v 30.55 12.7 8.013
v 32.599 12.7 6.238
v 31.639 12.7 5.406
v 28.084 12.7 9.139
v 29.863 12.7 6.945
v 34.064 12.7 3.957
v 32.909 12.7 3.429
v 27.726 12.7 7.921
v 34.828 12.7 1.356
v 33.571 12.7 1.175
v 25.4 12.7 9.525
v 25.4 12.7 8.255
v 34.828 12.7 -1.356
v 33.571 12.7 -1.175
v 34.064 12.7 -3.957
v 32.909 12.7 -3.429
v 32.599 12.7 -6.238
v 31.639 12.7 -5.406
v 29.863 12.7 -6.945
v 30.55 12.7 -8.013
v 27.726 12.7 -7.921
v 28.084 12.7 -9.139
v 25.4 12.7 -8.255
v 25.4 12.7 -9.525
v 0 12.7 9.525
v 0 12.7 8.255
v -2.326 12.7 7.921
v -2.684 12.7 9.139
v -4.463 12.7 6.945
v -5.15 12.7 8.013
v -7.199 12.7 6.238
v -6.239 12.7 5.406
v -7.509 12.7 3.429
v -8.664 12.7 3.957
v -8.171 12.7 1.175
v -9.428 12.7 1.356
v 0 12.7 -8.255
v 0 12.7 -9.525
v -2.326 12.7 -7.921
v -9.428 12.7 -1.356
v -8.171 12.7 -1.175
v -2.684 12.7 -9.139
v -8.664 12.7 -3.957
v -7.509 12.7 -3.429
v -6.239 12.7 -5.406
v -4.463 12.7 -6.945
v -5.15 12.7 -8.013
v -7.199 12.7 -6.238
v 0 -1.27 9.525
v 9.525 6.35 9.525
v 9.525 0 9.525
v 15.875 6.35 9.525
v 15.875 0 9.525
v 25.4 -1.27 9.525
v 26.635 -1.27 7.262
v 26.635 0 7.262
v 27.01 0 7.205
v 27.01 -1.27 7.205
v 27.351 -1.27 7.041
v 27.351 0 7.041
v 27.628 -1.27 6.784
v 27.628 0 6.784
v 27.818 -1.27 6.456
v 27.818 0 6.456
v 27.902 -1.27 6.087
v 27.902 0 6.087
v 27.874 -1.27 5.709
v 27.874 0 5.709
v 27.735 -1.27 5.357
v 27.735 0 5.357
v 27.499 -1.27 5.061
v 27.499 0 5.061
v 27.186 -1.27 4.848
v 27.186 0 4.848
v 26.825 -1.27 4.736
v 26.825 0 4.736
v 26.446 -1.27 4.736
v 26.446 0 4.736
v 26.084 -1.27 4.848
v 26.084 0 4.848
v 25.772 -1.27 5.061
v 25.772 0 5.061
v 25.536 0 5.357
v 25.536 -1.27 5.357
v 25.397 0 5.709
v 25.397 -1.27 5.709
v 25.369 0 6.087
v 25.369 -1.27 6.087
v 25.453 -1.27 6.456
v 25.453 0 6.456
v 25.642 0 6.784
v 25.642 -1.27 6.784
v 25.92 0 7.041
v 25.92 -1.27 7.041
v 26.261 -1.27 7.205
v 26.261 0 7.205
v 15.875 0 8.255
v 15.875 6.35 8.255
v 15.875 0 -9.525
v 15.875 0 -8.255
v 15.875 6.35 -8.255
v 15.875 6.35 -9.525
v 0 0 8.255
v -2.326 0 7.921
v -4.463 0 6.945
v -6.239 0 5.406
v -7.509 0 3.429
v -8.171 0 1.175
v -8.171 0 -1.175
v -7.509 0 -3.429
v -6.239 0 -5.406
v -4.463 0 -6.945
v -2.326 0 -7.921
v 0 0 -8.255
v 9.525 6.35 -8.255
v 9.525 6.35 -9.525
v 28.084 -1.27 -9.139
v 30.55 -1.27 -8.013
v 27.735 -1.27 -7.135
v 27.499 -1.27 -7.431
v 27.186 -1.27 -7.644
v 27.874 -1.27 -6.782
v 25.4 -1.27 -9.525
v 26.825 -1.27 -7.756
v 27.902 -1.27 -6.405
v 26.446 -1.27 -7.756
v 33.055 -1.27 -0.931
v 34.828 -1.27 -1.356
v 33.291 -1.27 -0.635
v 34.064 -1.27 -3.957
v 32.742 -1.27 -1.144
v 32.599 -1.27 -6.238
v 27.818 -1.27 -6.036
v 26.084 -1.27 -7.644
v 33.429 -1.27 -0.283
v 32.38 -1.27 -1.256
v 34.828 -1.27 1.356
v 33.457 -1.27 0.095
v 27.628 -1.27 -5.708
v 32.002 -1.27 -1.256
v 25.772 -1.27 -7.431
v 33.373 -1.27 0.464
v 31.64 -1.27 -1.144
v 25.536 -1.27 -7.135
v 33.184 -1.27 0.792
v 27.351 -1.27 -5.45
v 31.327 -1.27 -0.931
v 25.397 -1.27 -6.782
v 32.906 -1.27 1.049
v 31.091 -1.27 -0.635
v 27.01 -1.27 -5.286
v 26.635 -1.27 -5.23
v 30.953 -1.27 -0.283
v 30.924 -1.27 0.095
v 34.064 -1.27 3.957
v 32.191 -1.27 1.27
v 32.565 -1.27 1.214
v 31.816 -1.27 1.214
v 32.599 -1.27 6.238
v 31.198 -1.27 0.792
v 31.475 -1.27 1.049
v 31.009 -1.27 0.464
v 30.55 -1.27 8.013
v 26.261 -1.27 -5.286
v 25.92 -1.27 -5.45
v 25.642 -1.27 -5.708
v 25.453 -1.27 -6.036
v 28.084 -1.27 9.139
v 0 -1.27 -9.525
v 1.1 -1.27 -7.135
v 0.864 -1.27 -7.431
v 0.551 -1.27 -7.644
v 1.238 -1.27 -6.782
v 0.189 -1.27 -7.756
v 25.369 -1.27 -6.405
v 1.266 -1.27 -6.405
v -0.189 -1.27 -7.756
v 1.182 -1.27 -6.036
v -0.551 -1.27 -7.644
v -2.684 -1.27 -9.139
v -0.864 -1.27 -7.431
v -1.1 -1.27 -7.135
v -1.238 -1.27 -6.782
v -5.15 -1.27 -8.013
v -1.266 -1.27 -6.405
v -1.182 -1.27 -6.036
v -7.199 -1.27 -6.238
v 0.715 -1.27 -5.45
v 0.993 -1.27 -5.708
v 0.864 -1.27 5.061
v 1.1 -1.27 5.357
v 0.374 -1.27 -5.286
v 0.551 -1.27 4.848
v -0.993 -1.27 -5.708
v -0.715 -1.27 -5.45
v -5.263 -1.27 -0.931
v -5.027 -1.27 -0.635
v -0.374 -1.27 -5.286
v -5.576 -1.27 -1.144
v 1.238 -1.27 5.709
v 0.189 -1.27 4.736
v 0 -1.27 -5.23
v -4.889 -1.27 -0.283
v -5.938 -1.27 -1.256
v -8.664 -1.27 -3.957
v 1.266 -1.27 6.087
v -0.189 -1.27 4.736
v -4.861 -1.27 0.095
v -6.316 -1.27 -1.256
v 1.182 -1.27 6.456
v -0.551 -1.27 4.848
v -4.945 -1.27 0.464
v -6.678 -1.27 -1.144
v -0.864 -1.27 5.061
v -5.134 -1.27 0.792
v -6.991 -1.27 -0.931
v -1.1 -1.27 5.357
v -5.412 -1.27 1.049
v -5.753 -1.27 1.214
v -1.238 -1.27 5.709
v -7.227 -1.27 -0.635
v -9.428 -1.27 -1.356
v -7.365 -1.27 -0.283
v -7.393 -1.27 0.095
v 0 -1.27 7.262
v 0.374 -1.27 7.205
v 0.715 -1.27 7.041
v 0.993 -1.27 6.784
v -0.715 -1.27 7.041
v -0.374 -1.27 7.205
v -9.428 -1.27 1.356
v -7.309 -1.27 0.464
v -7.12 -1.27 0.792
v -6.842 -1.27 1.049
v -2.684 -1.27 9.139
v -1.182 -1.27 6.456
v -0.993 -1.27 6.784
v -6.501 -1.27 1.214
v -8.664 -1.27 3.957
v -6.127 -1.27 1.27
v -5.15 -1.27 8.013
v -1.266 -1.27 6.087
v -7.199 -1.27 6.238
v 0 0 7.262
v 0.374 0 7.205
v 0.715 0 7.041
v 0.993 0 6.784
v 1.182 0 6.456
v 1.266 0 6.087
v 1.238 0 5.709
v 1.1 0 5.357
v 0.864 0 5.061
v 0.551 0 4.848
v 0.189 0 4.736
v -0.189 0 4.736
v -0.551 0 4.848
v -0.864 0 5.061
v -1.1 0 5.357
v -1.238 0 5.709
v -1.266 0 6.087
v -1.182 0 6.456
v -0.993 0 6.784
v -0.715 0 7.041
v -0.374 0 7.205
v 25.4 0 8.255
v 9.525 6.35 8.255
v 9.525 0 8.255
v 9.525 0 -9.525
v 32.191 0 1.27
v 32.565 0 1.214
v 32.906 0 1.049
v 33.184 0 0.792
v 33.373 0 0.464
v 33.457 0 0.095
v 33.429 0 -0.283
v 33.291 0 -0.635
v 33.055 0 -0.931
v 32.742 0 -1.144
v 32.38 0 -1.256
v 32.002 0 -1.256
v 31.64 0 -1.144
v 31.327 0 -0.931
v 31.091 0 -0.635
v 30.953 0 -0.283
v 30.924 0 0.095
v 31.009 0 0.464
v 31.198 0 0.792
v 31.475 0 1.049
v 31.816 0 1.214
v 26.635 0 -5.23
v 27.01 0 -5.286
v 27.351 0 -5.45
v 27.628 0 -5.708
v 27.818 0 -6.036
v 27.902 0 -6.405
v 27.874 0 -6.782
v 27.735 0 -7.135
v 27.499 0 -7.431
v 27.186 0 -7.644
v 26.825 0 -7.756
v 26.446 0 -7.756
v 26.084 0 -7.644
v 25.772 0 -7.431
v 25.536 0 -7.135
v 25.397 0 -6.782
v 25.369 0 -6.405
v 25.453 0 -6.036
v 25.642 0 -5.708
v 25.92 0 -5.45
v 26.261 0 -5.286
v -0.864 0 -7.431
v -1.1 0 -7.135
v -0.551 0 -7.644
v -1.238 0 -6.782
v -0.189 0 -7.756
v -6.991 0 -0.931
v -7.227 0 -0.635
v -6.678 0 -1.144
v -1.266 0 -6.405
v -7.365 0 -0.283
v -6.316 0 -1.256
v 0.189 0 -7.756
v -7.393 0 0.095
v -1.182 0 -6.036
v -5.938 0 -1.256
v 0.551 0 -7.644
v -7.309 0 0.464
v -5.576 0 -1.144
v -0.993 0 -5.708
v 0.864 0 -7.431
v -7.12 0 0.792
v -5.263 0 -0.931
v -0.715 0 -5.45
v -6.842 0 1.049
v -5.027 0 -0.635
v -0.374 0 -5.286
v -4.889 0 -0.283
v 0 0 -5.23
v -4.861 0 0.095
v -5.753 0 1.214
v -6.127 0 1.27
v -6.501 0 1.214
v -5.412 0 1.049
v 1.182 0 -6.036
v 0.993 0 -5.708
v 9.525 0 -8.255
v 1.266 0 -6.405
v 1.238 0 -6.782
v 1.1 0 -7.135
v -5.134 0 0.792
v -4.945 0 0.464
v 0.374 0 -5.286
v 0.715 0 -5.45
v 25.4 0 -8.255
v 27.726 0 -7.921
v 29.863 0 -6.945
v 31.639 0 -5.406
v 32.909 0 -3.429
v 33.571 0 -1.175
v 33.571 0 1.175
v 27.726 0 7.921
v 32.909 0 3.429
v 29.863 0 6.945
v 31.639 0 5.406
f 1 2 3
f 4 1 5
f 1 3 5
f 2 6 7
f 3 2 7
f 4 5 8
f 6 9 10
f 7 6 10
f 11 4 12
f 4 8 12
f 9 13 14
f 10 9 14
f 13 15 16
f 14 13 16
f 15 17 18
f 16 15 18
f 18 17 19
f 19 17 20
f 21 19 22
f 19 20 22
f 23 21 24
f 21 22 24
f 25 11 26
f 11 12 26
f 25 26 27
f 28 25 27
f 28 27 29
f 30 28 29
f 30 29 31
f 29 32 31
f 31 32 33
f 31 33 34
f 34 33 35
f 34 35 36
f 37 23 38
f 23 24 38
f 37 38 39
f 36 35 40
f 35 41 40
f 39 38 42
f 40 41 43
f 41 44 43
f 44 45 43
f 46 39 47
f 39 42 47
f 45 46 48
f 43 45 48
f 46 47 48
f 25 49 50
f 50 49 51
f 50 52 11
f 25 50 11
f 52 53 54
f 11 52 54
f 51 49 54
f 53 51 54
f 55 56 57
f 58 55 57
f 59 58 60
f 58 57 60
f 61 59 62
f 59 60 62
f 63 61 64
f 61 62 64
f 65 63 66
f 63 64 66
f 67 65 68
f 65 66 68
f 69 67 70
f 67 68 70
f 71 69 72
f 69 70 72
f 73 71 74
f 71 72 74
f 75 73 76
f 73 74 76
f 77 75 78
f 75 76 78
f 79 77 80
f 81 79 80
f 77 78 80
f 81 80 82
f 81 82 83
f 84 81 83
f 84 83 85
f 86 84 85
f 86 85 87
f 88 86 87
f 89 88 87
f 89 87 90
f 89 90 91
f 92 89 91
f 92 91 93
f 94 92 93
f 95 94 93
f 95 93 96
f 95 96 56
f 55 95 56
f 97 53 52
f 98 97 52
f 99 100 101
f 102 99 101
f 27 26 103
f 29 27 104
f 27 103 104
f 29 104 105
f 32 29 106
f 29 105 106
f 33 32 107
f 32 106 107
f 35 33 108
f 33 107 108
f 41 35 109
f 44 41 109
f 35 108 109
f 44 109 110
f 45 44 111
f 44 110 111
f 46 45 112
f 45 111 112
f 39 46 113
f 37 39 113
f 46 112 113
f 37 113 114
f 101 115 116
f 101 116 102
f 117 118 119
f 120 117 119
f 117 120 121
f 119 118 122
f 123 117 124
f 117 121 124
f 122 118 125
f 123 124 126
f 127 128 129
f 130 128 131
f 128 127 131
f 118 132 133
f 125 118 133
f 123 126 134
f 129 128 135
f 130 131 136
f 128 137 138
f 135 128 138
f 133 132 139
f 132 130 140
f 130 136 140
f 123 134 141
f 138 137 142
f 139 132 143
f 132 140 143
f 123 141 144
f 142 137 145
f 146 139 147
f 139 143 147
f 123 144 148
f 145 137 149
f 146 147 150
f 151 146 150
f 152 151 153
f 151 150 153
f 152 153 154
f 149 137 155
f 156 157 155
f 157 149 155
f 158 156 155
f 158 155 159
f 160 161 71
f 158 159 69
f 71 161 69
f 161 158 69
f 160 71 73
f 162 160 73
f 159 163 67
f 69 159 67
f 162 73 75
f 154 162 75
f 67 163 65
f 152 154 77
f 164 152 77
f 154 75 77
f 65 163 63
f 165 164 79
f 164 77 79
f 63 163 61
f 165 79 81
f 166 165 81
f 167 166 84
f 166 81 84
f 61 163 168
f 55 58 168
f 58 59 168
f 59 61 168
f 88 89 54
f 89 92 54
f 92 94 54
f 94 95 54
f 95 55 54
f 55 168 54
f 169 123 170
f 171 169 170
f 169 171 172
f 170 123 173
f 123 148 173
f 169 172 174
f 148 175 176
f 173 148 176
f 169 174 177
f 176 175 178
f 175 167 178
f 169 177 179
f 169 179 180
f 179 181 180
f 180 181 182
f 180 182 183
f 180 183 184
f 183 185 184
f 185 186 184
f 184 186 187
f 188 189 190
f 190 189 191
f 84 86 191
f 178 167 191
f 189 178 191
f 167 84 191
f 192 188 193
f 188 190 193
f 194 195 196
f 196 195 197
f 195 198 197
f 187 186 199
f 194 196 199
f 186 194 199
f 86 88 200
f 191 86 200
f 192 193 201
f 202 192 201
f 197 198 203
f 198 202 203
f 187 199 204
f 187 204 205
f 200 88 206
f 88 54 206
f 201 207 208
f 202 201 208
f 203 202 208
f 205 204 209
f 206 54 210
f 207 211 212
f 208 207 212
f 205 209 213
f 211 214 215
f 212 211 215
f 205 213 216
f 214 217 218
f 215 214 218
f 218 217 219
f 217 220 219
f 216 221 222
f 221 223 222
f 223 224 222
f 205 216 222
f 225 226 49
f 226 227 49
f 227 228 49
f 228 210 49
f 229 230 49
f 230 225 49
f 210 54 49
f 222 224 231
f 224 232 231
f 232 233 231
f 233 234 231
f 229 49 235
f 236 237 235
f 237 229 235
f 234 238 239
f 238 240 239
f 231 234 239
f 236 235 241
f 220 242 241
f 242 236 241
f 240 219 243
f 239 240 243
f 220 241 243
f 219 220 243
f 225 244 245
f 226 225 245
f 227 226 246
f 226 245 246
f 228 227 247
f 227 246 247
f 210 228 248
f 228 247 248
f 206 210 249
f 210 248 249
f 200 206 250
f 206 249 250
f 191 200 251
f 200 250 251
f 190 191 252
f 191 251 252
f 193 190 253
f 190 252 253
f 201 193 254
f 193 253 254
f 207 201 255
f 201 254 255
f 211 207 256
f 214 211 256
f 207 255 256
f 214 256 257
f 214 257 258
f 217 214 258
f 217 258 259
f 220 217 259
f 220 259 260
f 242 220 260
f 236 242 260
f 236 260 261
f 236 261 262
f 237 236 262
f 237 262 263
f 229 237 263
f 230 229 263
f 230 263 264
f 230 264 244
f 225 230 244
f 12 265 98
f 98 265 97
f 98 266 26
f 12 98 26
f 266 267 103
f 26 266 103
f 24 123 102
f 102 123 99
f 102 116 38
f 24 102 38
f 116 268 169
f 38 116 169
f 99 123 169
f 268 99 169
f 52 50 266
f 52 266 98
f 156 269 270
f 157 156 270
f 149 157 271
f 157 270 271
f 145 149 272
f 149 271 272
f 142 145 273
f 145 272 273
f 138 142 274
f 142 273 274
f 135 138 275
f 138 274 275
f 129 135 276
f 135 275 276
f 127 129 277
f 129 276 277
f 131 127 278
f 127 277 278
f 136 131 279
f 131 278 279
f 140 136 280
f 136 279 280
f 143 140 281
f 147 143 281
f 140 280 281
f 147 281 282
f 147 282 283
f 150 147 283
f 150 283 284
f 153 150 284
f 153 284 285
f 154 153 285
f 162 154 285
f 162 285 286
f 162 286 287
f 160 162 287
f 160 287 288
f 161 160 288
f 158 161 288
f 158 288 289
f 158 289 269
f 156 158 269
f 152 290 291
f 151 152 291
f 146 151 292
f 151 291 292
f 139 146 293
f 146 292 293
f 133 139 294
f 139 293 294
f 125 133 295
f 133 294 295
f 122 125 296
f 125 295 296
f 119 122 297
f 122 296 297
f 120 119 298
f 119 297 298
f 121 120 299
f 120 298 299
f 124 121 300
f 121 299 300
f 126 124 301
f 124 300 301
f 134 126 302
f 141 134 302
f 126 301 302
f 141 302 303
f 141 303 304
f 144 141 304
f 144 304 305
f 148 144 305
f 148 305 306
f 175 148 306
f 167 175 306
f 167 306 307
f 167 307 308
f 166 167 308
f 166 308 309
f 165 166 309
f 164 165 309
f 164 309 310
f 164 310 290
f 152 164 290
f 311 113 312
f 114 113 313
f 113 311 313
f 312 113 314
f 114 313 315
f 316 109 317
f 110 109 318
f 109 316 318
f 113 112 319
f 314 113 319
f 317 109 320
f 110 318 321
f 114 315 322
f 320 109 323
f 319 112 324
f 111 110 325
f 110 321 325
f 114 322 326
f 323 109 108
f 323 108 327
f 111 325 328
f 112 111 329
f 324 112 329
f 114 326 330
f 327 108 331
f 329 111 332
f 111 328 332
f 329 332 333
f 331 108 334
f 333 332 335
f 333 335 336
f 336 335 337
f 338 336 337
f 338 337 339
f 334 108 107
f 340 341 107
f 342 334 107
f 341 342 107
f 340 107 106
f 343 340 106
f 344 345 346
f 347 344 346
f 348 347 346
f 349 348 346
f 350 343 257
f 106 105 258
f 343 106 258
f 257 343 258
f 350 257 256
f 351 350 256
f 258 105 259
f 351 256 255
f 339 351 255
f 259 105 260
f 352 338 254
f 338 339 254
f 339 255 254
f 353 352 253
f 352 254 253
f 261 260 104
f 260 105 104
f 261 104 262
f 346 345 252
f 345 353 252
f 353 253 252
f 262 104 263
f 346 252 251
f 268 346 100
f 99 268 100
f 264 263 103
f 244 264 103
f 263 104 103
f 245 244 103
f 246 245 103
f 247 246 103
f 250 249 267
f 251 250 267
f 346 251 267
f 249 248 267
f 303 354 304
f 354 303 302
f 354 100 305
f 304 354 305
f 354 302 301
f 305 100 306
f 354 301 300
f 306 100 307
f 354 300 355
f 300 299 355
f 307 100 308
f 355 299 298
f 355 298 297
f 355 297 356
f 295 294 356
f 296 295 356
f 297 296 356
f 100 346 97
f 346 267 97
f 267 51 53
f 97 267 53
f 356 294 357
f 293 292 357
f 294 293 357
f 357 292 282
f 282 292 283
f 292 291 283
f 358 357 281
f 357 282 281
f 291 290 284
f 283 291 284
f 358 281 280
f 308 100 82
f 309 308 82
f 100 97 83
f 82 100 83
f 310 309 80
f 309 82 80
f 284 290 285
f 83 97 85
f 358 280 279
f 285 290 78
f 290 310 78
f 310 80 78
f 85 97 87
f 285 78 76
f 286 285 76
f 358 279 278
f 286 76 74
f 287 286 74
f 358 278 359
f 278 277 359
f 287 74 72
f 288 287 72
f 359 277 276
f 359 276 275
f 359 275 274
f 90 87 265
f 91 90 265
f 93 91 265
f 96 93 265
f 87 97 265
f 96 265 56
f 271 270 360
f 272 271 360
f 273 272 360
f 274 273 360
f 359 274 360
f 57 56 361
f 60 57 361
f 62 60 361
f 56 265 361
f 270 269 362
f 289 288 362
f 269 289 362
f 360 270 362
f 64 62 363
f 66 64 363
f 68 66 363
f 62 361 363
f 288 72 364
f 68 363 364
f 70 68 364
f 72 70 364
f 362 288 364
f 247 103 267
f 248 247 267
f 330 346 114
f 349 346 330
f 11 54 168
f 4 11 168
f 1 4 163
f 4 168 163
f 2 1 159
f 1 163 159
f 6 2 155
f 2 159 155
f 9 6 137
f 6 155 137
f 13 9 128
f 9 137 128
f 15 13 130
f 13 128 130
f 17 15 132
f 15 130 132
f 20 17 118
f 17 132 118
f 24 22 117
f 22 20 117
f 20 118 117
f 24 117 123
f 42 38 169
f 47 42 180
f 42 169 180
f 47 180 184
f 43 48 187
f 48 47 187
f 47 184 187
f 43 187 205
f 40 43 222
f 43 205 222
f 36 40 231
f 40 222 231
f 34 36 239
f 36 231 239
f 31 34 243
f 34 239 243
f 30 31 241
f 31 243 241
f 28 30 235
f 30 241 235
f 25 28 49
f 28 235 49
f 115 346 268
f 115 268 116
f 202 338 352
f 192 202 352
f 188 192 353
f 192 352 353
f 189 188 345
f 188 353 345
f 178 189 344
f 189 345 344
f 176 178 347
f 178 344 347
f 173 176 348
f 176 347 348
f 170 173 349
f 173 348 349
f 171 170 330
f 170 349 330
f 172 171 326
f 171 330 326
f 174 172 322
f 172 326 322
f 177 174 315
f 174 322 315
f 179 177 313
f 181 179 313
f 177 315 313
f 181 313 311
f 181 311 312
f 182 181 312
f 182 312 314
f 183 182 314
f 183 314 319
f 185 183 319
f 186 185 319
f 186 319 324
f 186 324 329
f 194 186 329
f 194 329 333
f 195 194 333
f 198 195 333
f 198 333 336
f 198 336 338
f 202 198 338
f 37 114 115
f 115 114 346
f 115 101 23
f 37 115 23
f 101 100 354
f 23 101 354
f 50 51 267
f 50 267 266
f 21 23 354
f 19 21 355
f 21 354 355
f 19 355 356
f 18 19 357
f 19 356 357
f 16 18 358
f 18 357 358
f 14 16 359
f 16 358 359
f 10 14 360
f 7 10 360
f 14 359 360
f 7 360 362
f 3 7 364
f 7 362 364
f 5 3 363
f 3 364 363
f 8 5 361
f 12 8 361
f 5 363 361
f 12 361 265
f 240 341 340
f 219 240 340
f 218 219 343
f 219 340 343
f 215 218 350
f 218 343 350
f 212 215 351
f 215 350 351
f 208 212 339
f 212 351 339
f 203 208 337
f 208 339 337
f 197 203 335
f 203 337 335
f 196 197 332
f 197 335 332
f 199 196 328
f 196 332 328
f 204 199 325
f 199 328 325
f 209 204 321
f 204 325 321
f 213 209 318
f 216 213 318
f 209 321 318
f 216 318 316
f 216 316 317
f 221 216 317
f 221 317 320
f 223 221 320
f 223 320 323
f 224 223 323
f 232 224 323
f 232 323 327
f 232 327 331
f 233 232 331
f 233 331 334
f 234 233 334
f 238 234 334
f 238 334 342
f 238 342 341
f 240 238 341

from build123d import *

# Parameters (mm, degrees)
BOSS_EXTRUDE1_DEPTH = 12.7
BOSS_EXTRUDE2_START = 1.27
BOSS_EXTRUDE2_DEPTH = 1.27
SKETCH4_W           = 6.35
SKETCH4_H           = 6.35
CUT_EXTRUDE1_DEPTH  = 42.760604941
CUT_EXTRUDE2_REACH  = 40.364
SKETCH5_R           = 1.27


with BuildPart() as part:
    # Sketch2 → Boss-Extrude1 (new body)
    with BuildSketch(Plane(origin=(0, 0, 0), x_dir=(1, 0, 0), z_dir=(0, 1, 0))):
        with BuildLine():
            Line((0, 9.525), (25.4, 9.525))
            ThreePointArc((25.4, 9.525), (34.925, 0), (25.4, -9.525))
            Line((25.4, -9.525), (0, -9.525))
            ThreePointArc((0, -9.525), (-9.525, 0), (0, 9.525))
        make_face()
        with BuildLine():
            Line((0, 8.255), (25.4, 8.255))
            ThreePointArc((25.4, 8.255), (33.655, 0), (25.4, -8.255))
            Line((25.4, -8.255), (0, -8.255))
            ThreePointArc((0, -8.255), (-8.255, 0), (0, 8.255))
        make_face(mode=Mode.SUBTRACT)
    extrude(amount=BOSS_EXTRUDE1_DEPTH)

    # Sketch3 → Boss-Extrude2 (add)
    with BuildSketch(Plane.XZ.offset(BOSS_EXTRUDE2_START)):
        with BuildLine():
            Line((0, 9.525), (25.4, 9.525))
            ThreePointArc((25.4, 9.525), (34.925, 0), (25.4, -9.525))
            Line((25.4, -9.525), (0, -9.525))
            ThreePointArc((0, -9.525), (-9.525, 0), (0, 9.525))
        make_face()
    extrude(amount=-BOSS_EXTRUDE2_DEPTH)

    # Sketch4 → Cut-Extrude1 (cut, through all)
    with BuildSketch(Plane.XY.offset(9.525)):
        with Locations((12.7, 3.175)):
            Rectangle(SKETCH4_W, SKETCH4_H)
    extrude(amount=-CUT_EXTRUDE1_DEPTH, mode=Mode.SUBTRACT)

    # Sketch5 → Cut-Extrude2 (cut, up to next)
    with BuildSketch(Plane(origin=(0, 0, 0), x_dir=(1, 0, 0), z_dir=(0, 1, 0)), mode=Mode.PRIVATE) as cut_extrude2_sk1:
        with Locations(Location((-6.12696281, 0, 0), (0, 0, 270))):
            Circle(SKETCH5_R)
    cut_extrude2_tool1 = extrude(cut_extrude2_sk1.sketch, amount=-CUT_EXTRUDE2_REACH, mode=Mode.PRIVATE) & part.part
    # Sketch5 → Cut-Extrude2 (cut, up to next)
    with BuildSketch(Plane(origin=(0, 0, 0), x_dir=(1, 0, 0), z_dir=(0, 1, 0)), mode=Mode.PRIVATE) as cut_extrude2_sk2:
        with Locations(Location((32.190803921, 0, 0), (0, 0, 270))):
            Circle(SKETCH5_R)
    cut_extrude2_tool2 = extrude(cut_extrude2_sk2.sketch, amount=-CUT_EXTRUDE2_REACH, mode=Mode.PRIVATE) & part.part
    # Sketch5 → Cut-Extrude2 (cut, up to next)
    with BuildSketch(Plane(origin=(0, 0, 0), x_dir=(1, 0, 0), z_dir=(0, 1, 0)), mode=Mode.PRIVATE) as cut_extrude2_sk3:
        with Locations(Location((0, 6.499696211, 0), (0, 0, 270))):
            Circle(SKETCH5_R)
    cut_extrude2_tool3 = extrude(cut_extrude2_sk3.sketch, amount=-CUT_EXTRUDE2_REACH, mode=Mode.PRIVATE) & part.part
    # Sketch5 → Cut-Extrude2 (cut, up to next)
    with BuildSketch(Plane(origin=(0, 0, 0), x_dir=(1, 0, 0), z_dir=(0, 1, 0)), mode=Mode.PRIVATE) as cut_extrude2_sk4:
        with Locations(Location((0, -5.991753651, 0), (0, 0, 270))):
            Circle(SKETCH5_R)
    cut_extrude2_tool4 = extrude(cut_extrude2_sk4.sketch, amount=-CUT_EXTRUDE2_REACH, mode=Mode.PRIVATE) & part.part
    # Sketch5 → Cut-Extrude2 (cut, up to next)
    with BuildSketch(Plane(origin=(0, 0, 0), x_dir=(1, 0, 0), z_dir=(0, 1, 0)), mode=Mode.PRIVATE) as cut_extrude2_sk5:
        with Locations(Location((26.63537738, 6.499696211, 0), (0, 0, 270))):
            Circle(SKETCH5_R)
    cut_extrude2_tool5 = extrude(cut_extrude2_sk5.sketch, amount=-CUT_EXTRUDE2_REACH, mode=Mode.PRIVATE) & part.part
    # Sketch5 → Cut-Extrude2 (cut, up to next)
    with BuildSketch(Plane(origin=(0, 0, 0), x_dir=(1, 0, 0), z_dir=(0, 1, 0)), mode=Mode.PRIVATE) as cut_extrude2_sk6:
        with Locations(Location((26.63537738, -5.991753651, 0), (0, 0, 270))):
            Circle(SKETCH5_R)
    cut_extrude2_tool6 = extrude(cut_extrude2_sk6.sketch, amount=-CUT_EXTRUDE2_REACH, mode=Mode.PRIVATE) & part.part
    add(cut_extrude2_tool1.solids().sort_by_distance((-6.126963, 0, 0))[0], mode=Mode.SUBTRACT)
    add(cut_extrude2_tool2.solids().sort_by_distance((32.190804, 0, 0))[0], mode=Mode.SUBTRACT)
    add(cut_extrude2_tool3.solids().sort_by_distance((0, 0, -6.499696))[0], mode=Mode.SUBTRACT)
    add(cut_extrude2_tool4.solids().sort_by_distance((0, 0, 5.991754))[0], mode=Mode.SUBTRACT)
    add(cut_extrude2_tool5.solids().sort_by_distance((26.635377, 0, -6.499696))[0], mode=Mode.SUBTRACT)
    add(cut_extrude2_tool6.solids().sort_by_distance((26.635377, 0, 5.991754))[0], mode=Mode.SUBTRACT)


solid = part.part
